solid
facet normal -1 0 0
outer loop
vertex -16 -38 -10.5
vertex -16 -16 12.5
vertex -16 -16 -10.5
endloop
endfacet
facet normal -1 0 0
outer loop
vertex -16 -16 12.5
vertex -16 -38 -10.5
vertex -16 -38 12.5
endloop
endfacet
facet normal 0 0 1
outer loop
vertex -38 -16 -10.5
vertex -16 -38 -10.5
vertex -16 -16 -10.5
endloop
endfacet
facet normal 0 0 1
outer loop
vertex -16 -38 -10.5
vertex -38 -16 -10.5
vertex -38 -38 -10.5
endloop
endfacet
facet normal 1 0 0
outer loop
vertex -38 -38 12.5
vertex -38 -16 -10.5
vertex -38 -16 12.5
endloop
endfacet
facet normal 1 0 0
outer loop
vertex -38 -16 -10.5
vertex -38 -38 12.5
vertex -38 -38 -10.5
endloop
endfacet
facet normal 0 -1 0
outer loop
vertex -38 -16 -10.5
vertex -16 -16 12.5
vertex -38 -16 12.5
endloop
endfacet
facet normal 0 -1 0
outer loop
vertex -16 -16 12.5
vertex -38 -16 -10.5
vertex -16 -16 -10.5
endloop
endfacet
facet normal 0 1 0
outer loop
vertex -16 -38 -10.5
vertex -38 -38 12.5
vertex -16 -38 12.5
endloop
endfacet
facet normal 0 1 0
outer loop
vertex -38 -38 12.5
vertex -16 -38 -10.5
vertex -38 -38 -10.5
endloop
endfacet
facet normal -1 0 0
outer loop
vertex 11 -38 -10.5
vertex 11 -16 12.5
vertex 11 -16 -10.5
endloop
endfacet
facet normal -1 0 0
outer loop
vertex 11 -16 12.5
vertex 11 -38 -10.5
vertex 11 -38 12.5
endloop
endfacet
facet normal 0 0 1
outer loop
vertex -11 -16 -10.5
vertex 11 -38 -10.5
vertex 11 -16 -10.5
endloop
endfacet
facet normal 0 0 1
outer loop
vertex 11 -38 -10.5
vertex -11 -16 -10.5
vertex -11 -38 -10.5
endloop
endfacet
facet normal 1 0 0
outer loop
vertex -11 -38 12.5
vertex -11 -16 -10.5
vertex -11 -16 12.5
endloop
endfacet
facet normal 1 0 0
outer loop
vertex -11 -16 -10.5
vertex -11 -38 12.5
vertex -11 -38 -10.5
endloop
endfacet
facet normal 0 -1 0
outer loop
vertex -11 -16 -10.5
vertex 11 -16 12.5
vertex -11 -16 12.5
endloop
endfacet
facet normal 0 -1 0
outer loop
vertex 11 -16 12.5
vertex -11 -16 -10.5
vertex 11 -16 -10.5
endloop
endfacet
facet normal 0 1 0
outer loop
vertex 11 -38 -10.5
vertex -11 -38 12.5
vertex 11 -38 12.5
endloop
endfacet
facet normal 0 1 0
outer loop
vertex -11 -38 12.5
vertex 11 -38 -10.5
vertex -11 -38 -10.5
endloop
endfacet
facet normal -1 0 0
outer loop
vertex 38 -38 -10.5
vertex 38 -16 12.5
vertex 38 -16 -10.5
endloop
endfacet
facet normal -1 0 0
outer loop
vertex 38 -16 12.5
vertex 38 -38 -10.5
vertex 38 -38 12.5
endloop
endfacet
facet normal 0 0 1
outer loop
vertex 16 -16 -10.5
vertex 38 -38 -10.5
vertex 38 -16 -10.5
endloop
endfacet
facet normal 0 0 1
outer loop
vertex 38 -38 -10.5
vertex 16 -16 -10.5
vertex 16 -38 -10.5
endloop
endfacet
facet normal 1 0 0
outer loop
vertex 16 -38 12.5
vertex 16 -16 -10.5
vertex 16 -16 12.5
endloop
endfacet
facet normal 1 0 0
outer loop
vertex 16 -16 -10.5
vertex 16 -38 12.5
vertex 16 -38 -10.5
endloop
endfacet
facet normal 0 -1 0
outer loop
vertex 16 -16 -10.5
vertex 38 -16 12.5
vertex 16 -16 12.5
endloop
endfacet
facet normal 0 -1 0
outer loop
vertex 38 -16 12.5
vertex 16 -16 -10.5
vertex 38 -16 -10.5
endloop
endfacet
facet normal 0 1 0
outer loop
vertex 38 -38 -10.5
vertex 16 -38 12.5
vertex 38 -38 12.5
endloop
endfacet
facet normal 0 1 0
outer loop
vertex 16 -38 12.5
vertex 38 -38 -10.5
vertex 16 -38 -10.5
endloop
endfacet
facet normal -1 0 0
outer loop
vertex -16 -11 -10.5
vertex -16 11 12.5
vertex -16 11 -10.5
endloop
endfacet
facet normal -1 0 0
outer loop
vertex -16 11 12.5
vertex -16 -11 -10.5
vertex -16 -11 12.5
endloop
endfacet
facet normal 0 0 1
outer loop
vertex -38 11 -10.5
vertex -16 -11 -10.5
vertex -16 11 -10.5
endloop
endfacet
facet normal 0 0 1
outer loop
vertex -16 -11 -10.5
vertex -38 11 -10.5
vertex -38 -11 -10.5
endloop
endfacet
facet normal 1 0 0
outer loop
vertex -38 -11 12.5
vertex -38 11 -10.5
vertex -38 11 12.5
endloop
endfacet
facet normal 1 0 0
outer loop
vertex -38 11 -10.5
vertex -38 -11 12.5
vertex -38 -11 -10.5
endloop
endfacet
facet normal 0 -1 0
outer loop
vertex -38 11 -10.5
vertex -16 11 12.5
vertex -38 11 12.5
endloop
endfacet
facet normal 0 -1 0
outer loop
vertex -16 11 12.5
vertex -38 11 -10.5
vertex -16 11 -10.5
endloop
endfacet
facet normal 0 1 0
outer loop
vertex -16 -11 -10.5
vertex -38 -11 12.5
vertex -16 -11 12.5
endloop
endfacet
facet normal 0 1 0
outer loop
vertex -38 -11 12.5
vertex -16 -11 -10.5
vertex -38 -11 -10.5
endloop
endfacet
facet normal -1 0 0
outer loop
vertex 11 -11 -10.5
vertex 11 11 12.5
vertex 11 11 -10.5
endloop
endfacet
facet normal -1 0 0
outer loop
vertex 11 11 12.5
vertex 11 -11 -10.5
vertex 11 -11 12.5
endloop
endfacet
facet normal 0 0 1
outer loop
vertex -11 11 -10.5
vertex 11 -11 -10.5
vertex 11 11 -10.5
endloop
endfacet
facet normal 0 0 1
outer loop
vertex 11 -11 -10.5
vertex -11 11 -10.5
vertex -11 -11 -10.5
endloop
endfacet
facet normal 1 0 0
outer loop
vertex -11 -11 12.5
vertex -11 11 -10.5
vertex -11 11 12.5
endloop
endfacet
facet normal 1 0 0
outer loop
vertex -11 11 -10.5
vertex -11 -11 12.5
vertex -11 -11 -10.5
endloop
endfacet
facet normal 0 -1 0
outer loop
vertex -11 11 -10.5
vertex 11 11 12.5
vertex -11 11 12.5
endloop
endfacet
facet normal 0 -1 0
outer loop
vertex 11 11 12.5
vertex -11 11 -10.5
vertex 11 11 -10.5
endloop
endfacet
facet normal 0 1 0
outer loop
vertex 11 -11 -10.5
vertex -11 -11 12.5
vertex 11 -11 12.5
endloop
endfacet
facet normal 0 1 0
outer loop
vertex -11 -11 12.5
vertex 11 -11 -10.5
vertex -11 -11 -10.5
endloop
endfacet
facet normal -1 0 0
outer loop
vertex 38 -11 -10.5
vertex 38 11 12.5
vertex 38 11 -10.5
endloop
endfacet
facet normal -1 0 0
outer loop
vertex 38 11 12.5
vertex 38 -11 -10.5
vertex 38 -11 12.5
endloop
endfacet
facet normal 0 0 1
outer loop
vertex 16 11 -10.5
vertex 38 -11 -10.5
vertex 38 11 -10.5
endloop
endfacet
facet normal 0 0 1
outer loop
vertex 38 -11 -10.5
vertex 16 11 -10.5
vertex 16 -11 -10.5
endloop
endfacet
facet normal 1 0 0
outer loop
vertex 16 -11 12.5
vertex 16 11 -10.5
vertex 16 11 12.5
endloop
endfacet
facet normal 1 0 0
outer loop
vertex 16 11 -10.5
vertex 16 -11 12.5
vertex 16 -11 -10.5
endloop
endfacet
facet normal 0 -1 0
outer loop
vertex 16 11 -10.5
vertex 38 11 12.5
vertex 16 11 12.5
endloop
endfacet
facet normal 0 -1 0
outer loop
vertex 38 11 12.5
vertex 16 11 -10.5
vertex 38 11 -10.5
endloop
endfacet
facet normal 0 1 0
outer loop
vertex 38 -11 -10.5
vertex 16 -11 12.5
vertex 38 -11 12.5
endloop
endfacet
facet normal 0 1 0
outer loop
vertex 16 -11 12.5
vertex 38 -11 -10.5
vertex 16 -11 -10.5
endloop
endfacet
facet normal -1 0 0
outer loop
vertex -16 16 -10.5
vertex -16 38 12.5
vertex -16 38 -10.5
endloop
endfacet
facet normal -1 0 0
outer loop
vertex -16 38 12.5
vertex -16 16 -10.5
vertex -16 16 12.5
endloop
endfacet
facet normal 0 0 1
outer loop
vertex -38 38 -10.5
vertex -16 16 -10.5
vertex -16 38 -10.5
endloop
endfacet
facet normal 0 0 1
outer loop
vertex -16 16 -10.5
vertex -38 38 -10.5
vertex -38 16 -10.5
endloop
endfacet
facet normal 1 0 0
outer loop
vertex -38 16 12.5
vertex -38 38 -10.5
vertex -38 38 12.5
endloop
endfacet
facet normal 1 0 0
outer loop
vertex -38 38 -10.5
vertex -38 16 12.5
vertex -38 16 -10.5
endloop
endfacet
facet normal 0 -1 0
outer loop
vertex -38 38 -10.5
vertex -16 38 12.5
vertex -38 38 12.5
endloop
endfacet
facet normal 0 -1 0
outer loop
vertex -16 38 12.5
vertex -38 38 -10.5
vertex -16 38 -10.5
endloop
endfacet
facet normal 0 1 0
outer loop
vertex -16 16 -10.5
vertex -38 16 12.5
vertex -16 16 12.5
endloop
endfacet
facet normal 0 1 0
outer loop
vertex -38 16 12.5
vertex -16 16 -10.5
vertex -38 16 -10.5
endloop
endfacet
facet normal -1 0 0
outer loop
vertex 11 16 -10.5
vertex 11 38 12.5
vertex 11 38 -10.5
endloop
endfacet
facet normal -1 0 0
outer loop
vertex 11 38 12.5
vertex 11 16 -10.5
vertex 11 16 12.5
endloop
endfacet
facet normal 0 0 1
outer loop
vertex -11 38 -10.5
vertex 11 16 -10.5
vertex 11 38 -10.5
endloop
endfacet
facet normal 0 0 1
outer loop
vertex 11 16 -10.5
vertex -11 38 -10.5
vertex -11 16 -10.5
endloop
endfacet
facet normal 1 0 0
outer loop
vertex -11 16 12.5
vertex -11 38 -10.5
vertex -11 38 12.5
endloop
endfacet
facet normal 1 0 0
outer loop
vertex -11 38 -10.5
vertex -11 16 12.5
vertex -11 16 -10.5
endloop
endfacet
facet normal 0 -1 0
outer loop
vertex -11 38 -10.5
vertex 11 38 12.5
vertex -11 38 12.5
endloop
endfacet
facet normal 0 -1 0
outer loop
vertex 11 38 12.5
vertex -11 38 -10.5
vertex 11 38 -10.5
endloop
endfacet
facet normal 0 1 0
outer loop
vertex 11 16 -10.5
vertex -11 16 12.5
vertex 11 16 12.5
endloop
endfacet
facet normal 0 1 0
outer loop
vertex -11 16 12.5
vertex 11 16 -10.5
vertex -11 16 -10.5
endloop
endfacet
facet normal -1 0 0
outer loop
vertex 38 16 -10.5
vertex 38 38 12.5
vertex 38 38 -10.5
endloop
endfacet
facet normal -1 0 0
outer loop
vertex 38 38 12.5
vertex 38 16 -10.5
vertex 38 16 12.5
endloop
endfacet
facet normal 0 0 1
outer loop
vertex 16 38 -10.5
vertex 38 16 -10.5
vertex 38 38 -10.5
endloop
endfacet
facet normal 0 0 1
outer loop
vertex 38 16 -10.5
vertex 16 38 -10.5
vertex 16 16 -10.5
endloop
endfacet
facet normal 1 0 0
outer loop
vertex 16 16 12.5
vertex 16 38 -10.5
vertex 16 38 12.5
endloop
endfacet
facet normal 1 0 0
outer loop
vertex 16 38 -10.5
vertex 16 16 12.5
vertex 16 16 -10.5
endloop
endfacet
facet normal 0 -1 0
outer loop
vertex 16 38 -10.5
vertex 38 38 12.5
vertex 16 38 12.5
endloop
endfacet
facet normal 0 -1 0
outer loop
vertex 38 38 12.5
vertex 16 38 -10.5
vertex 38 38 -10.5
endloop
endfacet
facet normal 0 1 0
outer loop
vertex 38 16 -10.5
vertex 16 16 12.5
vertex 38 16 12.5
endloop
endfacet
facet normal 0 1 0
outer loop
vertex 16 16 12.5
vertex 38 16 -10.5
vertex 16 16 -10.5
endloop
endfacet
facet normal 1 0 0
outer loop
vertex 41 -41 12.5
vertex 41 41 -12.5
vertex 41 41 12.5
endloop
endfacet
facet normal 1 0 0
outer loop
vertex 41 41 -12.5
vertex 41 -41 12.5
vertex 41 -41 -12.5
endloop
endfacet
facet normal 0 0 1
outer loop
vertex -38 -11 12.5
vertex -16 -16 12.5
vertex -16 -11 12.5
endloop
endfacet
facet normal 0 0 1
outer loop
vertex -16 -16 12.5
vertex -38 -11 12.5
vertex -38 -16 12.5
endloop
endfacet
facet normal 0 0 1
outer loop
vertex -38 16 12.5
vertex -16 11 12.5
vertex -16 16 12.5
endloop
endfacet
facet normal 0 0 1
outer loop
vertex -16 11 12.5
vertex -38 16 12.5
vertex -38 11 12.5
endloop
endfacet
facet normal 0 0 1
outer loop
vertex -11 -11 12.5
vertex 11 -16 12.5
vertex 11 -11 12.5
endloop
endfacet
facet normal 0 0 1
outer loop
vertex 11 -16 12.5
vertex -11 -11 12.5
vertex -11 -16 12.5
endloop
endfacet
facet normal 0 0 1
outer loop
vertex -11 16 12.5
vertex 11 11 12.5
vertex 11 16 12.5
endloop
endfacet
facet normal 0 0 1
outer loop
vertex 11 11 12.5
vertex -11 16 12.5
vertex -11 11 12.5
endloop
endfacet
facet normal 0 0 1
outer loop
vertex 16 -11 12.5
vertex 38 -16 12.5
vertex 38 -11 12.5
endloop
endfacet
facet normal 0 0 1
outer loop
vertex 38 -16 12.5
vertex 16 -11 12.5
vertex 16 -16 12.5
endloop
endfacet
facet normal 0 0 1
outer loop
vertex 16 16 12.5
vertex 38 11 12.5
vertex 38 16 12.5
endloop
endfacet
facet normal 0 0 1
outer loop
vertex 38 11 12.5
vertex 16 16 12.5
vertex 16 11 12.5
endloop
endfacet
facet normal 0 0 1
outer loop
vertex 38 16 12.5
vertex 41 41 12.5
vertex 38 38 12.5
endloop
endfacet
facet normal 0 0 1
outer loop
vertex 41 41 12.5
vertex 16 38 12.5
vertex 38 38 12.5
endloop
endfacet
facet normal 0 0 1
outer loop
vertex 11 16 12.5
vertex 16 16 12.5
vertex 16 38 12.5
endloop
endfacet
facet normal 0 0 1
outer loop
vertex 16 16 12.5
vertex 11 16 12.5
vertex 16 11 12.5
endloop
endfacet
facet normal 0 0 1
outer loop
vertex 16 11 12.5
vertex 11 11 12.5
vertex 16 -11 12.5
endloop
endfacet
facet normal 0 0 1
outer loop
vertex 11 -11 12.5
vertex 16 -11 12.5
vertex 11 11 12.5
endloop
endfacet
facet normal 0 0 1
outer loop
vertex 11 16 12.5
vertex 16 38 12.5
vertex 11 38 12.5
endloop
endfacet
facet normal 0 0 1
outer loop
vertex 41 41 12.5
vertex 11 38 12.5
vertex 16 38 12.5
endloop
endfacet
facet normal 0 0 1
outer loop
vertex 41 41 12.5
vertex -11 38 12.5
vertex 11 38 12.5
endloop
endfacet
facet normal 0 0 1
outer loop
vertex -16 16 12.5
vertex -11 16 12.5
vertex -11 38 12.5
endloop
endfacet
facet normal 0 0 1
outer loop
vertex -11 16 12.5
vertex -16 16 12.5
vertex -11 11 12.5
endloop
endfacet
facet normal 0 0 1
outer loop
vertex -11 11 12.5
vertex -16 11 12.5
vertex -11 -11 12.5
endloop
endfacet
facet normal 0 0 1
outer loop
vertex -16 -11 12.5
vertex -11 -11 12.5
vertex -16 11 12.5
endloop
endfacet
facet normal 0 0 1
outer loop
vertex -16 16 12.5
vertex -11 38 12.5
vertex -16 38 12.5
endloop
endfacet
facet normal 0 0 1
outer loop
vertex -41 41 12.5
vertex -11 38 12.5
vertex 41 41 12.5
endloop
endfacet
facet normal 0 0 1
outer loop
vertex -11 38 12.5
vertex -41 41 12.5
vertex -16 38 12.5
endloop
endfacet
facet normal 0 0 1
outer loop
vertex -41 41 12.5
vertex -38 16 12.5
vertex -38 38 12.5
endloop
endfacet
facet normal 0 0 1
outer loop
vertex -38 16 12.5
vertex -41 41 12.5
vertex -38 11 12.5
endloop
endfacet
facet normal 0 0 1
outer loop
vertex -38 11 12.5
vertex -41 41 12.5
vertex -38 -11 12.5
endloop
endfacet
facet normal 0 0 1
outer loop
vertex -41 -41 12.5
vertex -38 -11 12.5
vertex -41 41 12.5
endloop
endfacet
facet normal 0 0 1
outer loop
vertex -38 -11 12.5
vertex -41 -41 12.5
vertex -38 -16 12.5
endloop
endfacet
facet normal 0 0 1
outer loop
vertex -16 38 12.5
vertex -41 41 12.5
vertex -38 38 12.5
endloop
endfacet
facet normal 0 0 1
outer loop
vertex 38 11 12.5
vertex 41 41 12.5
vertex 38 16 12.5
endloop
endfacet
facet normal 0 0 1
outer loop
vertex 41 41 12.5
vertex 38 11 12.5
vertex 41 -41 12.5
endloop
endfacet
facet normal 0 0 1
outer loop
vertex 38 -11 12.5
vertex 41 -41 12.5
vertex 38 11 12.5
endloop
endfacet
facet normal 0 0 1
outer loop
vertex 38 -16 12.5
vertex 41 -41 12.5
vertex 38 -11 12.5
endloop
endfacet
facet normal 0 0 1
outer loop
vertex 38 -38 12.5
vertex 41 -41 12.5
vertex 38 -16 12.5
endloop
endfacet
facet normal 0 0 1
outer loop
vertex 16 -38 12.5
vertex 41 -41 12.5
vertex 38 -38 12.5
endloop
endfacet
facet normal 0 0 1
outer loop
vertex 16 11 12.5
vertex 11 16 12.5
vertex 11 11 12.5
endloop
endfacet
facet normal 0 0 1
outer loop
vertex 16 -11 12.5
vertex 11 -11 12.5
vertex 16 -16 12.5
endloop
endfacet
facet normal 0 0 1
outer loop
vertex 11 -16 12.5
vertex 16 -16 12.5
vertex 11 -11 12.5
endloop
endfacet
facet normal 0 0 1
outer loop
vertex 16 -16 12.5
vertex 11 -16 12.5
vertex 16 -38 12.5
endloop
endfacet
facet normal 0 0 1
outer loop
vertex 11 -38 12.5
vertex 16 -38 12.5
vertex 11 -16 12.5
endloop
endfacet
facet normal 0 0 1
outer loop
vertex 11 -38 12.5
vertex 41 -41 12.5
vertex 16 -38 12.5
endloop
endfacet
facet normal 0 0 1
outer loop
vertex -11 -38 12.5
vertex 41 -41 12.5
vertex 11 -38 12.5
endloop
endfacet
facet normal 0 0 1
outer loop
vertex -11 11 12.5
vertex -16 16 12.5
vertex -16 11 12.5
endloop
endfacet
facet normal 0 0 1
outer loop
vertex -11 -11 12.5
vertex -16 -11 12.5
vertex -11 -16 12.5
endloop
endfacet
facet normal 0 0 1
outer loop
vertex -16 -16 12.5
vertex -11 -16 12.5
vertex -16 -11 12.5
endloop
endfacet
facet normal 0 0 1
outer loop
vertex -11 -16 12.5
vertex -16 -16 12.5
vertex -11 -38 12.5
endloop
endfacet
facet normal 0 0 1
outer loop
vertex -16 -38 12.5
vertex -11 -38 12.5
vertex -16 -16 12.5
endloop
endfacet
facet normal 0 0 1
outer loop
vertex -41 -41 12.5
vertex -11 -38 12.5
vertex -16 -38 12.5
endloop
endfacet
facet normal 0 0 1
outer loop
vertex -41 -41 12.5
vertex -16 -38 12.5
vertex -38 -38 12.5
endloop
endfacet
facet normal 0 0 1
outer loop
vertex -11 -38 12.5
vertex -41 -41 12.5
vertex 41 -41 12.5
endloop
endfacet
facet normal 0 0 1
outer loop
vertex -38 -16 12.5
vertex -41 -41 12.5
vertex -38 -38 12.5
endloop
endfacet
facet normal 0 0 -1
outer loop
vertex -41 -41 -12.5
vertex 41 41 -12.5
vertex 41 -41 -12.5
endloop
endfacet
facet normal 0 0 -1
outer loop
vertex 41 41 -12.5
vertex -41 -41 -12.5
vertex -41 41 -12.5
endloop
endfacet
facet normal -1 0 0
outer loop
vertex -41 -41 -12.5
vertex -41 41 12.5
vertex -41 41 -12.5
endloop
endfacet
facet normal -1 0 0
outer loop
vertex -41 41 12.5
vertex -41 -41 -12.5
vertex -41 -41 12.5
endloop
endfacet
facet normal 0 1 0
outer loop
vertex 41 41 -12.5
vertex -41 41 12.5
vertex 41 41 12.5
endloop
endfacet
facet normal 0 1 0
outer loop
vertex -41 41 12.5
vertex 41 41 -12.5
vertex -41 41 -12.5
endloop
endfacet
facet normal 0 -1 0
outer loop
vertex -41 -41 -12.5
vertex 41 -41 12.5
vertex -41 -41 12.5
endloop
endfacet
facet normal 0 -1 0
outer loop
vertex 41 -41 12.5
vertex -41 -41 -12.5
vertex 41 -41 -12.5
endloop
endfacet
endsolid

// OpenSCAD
$fn = 32;

// ----------------------------------------------------------------------
// Pocket plate 82 x 82 x 25
// 3 x 3 pockets 22 mm square, 23 mm deep
// ----------------------------------------------------------------------

// --- parameters (mm) ---
thickness = 25;   // plate thickness
seat_tol = 0.15;  // tolerance at the seating features
free_tol = 0.5;   // general tolerance on the free sizes
floor_t = 2;      // material left under each pocket
pocket = 22;      // pocket side length
pitch_x = 27;     // pocket pitch along X
pitch_y = 27;     // pocket pitch along Y
cols = 3;         // pockets per row
rows = 3;         // rows of pockets

// --- derived feature positions (mm) ---
depth = thickness - floor_t;        // = 23   pocket depth, down to the floor
span_x = (cols - 1) * pitch_x;      // = 54   distance between outer pockets
span_y = (rows - 1) * pitch_y;      // = 54   distance between outer pocket rows
origin_x = -span_x / 2;             // = -27   X of the first pocket
origin_y = -span_y / 2;             // = -27   Y of the first pocket
plate = [span_x + pocket + 6, span_y + pocket + 6, thickness];  // = [82, 82, 25]   overall size: pockets plus 3 mm of wall on each side
feature_centers = [
  [origin_x + 0 * pitch_x, origin_y + 0 * pitch_y],
  [origin_x + 1 * pitch_x, origin_y + 0 * pitch_y],
  [origin_x + 2 * pitch_x, origin_y + 0 * pitch_y],
  [origin_x + 0 * pitch_x, origin_y + 1 * pitch_y],
  [origin_x + 1 * pitch_x, origin_y + 1 * pitch_y],
  [origin_x + 2 * pitch_x, origin_y + 1 * pitch_y],
  [origin_x + 0 * pitch_x, origin_y + 2 * pitch_y],
  [origin_x + 1 * pitch_x, origin_y + 2 * pitch_y],
  [origin_x + 2 * pitch_x, origin_y + 2 * pitch_y]
];   // pocket centres, used verbatim by the cutter loop

// plate outline, then one pocket per centre in feature_centers
difference() {
  cube(plate, center = true);
  for (centre = feature_centers)
    translate([centre[0] - pocket / 2, centre[1] - pocket / 2, plate[2] / 2 - depth])
      cube([pocket, pocket, depth + 1]);  // centred on the declared pocket centre
}
